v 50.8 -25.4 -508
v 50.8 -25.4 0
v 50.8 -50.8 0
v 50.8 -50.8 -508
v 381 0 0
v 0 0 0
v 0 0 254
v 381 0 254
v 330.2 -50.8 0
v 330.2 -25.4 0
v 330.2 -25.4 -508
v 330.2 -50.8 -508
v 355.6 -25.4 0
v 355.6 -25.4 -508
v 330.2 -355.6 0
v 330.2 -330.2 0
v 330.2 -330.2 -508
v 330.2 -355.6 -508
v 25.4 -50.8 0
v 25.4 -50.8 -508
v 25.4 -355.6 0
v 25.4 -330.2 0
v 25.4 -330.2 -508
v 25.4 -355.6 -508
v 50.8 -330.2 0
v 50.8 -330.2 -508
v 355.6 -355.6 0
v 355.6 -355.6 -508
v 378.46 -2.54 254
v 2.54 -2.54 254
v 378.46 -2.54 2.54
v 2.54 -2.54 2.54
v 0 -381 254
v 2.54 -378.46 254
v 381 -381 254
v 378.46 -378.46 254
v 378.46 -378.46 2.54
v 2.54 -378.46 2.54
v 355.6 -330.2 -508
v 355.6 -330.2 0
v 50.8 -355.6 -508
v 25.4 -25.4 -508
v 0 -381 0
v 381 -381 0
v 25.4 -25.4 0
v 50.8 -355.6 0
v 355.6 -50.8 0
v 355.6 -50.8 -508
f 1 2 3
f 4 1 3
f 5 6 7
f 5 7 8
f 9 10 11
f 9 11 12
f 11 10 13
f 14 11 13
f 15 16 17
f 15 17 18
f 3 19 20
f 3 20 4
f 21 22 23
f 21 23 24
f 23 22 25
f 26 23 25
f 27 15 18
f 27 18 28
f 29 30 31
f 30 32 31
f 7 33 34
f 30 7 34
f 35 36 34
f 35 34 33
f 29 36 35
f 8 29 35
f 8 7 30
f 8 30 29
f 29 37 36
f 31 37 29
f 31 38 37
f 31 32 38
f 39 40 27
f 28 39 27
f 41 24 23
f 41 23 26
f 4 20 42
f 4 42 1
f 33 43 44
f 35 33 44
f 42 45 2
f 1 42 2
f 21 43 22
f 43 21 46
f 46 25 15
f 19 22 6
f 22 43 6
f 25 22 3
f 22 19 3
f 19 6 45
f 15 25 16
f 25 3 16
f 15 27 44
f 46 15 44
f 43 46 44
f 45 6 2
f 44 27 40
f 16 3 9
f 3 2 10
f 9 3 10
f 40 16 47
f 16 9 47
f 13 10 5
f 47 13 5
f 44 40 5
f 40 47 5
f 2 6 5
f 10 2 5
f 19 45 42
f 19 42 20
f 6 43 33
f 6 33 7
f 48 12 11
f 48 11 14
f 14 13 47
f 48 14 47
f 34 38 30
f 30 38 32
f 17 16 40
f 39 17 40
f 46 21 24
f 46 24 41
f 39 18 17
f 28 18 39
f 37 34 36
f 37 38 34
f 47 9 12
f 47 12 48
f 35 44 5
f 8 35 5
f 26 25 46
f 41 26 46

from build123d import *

# Parameters (mm, degrees)
F0_W     = 381
F0_H     = 381
F1_DEPTH = 254
F2_T     = -2.54
F3_W     = 25.4
F3_H     = 25.4
F4_DEPTH = 508


with BuildPart() as f1:
    # F0 (on Top) → F1 (new body)
    with BuildSketch(Plane.XY):
        with Locations((190.5, -190.5)):
            Rectangle(F0_W, F0_H)
    extrude(amount=F1_DEPTH)

    # F2
    f2_openings = [f1.faces().sort_by_distance(p)[0] for p in [
        (190.5, -190.5, 254),
    ]]
    offset(amount=F2_T, openings=f2_openings)

    # F3 (on face) → F4 (join)
    with BuildSketch(Plane(origin=(0, 0, 0), x_dir=(1, 0, 0), z_dir=(0, 0, -1))):
        with Locations((38.1, 342.9)):
            Rectangle(F3_W, F3_H)
        with Locations((342.9, 342.9)):
            Rectangle(F3_W, F3_H)
        with Locations((38.1, 38.1)):
            Rectangle(F3_W, F3_H)
        with Locations((342.9, 38.1)):
            Rectangle(F3_W, F3_H)
    extrude(amount=F4_DEPTH)


solid = f1.part
